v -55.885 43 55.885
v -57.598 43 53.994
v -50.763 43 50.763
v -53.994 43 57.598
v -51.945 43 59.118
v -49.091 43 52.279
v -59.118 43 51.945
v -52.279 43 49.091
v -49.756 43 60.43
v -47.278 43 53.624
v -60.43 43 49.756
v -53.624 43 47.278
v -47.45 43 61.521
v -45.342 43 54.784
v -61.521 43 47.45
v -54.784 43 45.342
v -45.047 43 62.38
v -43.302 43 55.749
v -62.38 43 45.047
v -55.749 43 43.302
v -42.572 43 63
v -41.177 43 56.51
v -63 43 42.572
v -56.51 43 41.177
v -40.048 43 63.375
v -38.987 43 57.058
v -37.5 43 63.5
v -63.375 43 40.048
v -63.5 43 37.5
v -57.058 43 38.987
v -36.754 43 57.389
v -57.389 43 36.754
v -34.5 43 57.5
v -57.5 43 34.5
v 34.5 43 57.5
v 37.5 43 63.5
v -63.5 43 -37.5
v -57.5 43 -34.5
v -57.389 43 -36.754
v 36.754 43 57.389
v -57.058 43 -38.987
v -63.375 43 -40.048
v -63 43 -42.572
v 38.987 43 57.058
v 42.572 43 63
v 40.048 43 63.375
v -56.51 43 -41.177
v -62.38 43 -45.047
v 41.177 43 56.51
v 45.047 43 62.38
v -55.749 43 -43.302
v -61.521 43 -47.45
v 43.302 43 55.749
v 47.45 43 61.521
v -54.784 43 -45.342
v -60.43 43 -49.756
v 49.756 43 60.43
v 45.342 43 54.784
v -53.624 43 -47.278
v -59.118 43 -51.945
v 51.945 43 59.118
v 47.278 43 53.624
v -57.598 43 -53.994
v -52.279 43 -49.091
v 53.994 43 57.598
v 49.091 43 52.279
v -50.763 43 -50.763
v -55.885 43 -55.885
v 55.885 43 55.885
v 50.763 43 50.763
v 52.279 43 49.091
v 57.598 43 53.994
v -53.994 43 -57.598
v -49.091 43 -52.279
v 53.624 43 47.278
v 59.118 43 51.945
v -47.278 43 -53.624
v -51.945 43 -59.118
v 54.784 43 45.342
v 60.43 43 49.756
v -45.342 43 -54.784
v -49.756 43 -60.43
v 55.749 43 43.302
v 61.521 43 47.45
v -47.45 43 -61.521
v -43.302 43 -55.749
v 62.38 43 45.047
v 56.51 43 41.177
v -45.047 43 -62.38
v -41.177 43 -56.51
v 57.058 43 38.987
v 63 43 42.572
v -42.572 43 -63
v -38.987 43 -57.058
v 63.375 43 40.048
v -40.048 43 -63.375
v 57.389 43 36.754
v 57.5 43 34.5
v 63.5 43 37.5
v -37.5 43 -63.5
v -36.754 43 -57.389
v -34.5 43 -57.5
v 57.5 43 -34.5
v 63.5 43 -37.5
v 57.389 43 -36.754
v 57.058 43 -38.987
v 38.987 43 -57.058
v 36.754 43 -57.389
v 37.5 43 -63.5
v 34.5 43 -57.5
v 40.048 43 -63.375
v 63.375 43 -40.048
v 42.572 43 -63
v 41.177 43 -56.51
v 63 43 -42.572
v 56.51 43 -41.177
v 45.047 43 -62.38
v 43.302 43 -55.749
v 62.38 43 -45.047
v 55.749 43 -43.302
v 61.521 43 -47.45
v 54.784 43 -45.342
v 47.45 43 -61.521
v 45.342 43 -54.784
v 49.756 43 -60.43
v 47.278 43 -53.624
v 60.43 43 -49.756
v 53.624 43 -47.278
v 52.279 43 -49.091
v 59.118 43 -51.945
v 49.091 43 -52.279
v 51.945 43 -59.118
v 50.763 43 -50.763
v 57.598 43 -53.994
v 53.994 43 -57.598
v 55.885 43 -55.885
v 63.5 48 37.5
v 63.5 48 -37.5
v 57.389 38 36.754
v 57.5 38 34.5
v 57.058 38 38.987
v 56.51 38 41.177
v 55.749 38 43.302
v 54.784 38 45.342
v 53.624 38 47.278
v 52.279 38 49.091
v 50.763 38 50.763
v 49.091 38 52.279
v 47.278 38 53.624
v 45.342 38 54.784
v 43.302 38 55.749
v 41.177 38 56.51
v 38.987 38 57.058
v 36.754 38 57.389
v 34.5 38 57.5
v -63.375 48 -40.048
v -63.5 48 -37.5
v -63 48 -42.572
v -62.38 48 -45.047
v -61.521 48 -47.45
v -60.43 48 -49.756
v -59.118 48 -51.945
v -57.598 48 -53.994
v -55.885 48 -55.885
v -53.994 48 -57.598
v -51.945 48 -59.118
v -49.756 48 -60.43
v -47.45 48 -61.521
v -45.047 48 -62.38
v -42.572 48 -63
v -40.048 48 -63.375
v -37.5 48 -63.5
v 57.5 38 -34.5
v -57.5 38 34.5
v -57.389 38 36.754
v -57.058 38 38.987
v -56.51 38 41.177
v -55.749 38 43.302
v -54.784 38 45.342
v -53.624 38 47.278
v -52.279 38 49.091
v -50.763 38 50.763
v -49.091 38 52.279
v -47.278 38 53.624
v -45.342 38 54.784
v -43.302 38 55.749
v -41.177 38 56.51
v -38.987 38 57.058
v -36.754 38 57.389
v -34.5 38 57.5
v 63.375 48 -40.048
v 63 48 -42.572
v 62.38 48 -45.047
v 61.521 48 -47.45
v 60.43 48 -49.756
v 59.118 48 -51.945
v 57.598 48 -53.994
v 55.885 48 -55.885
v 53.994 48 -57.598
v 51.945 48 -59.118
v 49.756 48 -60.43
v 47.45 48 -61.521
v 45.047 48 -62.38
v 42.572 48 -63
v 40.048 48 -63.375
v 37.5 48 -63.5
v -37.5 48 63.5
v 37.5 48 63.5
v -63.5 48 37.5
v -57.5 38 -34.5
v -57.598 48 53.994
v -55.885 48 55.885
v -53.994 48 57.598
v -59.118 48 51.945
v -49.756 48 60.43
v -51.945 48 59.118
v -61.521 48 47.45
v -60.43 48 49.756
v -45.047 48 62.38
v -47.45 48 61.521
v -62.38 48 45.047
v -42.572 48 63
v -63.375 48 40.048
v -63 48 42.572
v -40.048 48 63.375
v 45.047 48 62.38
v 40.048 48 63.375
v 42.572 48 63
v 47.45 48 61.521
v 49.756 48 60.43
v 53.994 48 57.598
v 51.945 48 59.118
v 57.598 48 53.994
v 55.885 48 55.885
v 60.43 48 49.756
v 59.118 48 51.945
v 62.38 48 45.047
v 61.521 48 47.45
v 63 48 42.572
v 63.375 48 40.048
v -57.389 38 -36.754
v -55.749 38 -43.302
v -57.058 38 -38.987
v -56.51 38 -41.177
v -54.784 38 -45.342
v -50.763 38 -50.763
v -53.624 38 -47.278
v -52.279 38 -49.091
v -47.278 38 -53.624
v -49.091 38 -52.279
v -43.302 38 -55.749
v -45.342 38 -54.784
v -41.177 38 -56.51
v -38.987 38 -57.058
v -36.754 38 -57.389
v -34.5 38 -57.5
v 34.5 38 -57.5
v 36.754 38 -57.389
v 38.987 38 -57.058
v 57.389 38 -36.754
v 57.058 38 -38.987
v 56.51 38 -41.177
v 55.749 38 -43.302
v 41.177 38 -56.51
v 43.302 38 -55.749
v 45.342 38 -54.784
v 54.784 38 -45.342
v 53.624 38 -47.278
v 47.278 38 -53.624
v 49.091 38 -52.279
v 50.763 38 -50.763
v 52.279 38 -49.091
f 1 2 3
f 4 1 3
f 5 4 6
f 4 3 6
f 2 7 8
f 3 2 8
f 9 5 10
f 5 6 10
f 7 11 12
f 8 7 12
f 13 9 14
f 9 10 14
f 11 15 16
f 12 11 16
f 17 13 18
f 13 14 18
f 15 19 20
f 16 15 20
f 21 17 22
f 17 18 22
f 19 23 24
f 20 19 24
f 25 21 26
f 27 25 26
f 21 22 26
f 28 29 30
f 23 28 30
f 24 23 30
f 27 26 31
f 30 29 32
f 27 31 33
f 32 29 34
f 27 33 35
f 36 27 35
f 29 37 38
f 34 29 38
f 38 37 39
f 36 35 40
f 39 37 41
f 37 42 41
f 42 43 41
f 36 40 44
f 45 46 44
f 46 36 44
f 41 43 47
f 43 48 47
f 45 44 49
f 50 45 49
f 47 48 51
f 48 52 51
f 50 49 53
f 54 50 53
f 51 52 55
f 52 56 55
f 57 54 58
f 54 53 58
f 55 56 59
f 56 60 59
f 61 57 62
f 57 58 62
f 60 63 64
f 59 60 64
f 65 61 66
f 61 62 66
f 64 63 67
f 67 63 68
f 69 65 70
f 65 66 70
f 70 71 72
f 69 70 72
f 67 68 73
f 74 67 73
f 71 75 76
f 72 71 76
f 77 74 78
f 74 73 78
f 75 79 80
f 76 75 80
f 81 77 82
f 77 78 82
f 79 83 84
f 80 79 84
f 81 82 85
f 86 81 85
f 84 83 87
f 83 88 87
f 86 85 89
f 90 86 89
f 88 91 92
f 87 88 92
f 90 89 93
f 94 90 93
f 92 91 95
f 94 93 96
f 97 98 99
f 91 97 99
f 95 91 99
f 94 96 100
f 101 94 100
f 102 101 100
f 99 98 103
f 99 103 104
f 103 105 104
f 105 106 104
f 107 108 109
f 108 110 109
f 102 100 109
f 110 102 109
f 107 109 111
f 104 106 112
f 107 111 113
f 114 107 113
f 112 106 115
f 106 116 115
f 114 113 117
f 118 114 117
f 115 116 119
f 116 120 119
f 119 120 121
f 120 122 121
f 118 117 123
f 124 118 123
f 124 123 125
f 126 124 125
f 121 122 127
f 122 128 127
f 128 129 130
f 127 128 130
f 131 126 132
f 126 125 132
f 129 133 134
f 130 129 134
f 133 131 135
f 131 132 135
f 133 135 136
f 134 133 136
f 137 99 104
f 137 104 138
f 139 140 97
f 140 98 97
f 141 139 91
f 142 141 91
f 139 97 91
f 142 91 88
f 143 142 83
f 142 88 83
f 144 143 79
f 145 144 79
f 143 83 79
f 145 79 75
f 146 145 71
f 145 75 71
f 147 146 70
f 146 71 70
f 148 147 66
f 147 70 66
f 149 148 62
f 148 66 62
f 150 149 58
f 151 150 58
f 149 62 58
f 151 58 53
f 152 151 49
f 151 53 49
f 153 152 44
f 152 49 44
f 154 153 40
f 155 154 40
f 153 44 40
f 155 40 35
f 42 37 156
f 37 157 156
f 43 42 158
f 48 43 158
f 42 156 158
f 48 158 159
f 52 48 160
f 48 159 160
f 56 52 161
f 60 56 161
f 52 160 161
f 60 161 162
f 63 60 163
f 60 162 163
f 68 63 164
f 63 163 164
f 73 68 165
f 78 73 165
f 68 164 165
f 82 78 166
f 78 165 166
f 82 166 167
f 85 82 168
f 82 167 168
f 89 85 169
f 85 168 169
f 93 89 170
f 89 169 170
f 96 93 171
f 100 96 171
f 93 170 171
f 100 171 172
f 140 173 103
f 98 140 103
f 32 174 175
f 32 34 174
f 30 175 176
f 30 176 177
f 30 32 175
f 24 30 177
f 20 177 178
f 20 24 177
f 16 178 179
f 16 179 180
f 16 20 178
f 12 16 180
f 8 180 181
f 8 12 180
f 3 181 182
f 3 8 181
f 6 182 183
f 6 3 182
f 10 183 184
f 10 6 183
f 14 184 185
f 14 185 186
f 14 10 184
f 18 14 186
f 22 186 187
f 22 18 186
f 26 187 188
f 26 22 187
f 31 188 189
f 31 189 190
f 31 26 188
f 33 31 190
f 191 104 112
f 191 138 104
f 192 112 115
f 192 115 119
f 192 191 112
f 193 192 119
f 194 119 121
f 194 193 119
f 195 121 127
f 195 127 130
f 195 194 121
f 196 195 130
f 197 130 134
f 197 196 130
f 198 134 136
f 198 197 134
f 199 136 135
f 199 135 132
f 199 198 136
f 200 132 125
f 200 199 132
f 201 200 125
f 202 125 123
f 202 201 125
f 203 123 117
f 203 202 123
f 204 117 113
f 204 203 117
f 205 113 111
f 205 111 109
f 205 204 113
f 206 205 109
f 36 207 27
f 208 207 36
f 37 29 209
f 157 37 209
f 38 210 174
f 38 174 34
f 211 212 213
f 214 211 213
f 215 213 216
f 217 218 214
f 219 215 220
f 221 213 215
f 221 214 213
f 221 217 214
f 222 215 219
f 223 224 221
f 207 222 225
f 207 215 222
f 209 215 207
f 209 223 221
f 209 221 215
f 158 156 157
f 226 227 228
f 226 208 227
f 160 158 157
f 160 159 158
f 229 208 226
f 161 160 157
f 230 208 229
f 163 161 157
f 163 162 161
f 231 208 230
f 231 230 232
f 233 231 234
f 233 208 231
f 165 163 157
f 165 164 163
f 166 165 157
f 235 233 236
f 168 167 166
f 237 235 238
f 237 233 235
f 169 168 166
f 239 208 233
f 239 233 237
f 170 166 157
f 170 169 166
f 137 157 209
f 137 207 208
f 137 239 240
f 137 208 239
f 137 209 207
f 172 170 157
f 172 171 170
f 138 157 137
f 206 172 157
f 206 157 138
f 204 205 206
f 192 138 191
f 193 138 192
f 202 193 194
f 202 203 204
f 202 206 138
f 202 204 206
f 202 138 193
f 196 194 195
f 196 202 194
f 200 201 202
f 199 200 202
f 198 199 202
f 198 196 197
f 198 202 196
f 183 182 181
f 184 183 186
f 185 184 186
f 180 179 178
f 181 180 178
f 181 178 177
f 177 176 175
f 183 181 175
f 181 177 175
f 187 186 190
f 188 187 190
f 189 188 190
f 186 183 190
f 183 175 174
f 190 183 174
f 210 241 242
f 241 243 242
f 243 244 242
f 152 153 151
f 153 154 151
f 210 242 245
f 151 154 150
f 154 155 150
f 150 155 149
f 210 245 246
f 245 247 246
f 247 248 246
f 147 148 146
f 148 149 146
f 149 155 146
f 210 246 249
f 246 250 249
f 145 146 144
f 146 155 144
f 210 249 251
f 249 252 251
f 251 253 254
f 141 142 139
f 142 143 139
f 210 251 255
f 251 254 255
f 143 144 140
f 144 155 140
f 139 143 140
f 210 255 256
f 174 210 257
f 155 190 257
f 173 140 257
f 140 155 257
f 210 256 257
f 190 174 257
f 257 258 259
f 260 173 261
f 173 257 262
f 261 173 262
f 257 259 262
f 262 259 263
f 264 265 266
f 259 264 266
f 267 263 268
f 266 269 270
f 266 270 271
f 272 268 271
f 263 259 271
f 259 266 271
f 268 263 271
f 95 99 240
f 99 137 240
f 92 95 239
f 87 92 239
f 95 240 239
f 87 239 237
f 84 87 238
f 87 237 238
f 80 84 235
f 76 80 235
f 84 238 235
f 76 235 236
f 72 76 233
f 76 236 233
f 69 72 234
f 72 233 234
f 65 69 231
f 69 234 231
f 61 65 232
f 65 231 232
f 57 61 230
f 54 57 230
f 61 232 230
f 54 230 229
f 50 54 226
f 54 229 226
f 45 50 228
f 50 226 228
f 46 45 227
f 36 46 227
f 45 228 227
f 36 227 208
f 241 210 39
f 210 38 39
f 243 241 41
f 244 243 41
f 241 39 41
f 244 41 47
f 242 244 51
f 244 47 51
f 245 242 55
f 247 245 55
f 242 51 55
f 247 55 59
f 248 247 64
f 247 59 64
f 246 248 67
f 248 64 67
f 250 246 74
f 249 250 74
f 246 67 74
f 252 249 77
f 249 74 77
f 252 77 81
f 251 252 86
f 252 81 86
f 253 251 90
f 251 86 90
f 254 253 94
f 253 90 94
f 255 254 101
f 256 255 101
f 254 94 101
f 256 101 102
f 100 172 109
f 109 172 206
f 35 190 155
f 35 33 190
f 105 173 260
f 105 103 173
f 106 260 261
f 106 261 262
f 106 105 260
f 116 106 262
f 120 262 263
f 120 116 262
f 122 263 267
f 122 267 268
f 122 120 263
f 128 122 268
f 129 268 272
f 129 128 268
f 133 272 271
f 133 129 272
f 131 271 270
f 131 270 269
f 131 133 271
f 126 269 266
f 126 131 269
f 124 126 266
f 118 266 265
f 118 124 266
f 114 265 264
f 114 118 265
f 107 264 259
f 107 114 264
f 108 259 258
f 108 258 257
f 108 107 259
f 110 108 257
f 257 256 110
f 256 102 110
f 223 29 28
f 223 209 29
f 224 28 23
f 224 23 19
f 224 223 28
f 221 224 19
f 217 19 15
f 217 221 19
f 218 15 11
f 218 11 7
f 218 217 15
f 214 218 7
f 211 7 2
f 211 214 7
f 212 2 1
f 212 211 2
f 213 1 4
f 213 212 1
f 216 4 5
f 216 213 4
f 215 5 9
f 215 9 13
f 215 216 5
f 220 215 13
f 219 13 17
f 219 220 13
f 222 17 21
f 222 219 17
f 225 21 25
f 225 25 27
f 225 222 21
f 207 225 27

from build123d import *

# Parameters (mm, degrees)
BOX003_W     = 115
BOX003_H     = 5
BOX003_DEPTH = 115
FILLET003_R  = 23
BOX002_W     = 127
BOX002_H     = 5
BOX002_DEPTH = 127
FILLET002_R  = 26


with BuildPart() as inside001:
    # Box003 → Box003 (new body)
    with BuildSketch(Plane(origin=(-57.5, 20, -57.5), x_dir=(1, 0, 0), z_dir=(0, 0, 1))):
        with Locations((57.5, 2.5)):
            Rectangle(BOX003_W, BOX003_H)
    extrude(amount=BOX003_DEPTH)

    # Fillet003
    fillet003_edges = [inside001.edges().sort_by_distance(p)[0] for p in [
        (-57.5, 22.5, 57.5),
        (-57.5, 22.5, -57.5),
        (57.5, 22.5, 57.5),
        (57.5, 22.5, -57.5),
    ]]
    fillet(fillet003_edges, radius=FILLET003_R)


with BuildPart() as cover:
    # Box002 → Box002 (new body)
    with BuildSketch(Plane(origin=(-63.5, 25, -63.5), x_dir=(1, 0, 0), z_dir=(0, 0, 1))):
        with Locations((63.5, 2.5)):
            Rectangle(BOX002_W, BOX002_H)
    extrude(amount=BOX002_DEPTH)

    # Fillet002
    fillet002_edges = [cover.edges().sort_by_distance(p)[0] for p in [
        (-63.5, 27.5, 63.5),
        (-63.5, 27.5, -63.5),
        (63.5, 27.5, 63.5),
        (63.5, 27.5, -63.5),
    ]]
    fillet(fillet002_edges, radius=FILLET002_R)

    # Fusion: union Inside001
    add(inside001.part)


with BuildPart() as cover_1:
    # Fusion placement: moved
    add(cover.part.moved(Location((0, 18, 0))))


solid = cover_1.part
